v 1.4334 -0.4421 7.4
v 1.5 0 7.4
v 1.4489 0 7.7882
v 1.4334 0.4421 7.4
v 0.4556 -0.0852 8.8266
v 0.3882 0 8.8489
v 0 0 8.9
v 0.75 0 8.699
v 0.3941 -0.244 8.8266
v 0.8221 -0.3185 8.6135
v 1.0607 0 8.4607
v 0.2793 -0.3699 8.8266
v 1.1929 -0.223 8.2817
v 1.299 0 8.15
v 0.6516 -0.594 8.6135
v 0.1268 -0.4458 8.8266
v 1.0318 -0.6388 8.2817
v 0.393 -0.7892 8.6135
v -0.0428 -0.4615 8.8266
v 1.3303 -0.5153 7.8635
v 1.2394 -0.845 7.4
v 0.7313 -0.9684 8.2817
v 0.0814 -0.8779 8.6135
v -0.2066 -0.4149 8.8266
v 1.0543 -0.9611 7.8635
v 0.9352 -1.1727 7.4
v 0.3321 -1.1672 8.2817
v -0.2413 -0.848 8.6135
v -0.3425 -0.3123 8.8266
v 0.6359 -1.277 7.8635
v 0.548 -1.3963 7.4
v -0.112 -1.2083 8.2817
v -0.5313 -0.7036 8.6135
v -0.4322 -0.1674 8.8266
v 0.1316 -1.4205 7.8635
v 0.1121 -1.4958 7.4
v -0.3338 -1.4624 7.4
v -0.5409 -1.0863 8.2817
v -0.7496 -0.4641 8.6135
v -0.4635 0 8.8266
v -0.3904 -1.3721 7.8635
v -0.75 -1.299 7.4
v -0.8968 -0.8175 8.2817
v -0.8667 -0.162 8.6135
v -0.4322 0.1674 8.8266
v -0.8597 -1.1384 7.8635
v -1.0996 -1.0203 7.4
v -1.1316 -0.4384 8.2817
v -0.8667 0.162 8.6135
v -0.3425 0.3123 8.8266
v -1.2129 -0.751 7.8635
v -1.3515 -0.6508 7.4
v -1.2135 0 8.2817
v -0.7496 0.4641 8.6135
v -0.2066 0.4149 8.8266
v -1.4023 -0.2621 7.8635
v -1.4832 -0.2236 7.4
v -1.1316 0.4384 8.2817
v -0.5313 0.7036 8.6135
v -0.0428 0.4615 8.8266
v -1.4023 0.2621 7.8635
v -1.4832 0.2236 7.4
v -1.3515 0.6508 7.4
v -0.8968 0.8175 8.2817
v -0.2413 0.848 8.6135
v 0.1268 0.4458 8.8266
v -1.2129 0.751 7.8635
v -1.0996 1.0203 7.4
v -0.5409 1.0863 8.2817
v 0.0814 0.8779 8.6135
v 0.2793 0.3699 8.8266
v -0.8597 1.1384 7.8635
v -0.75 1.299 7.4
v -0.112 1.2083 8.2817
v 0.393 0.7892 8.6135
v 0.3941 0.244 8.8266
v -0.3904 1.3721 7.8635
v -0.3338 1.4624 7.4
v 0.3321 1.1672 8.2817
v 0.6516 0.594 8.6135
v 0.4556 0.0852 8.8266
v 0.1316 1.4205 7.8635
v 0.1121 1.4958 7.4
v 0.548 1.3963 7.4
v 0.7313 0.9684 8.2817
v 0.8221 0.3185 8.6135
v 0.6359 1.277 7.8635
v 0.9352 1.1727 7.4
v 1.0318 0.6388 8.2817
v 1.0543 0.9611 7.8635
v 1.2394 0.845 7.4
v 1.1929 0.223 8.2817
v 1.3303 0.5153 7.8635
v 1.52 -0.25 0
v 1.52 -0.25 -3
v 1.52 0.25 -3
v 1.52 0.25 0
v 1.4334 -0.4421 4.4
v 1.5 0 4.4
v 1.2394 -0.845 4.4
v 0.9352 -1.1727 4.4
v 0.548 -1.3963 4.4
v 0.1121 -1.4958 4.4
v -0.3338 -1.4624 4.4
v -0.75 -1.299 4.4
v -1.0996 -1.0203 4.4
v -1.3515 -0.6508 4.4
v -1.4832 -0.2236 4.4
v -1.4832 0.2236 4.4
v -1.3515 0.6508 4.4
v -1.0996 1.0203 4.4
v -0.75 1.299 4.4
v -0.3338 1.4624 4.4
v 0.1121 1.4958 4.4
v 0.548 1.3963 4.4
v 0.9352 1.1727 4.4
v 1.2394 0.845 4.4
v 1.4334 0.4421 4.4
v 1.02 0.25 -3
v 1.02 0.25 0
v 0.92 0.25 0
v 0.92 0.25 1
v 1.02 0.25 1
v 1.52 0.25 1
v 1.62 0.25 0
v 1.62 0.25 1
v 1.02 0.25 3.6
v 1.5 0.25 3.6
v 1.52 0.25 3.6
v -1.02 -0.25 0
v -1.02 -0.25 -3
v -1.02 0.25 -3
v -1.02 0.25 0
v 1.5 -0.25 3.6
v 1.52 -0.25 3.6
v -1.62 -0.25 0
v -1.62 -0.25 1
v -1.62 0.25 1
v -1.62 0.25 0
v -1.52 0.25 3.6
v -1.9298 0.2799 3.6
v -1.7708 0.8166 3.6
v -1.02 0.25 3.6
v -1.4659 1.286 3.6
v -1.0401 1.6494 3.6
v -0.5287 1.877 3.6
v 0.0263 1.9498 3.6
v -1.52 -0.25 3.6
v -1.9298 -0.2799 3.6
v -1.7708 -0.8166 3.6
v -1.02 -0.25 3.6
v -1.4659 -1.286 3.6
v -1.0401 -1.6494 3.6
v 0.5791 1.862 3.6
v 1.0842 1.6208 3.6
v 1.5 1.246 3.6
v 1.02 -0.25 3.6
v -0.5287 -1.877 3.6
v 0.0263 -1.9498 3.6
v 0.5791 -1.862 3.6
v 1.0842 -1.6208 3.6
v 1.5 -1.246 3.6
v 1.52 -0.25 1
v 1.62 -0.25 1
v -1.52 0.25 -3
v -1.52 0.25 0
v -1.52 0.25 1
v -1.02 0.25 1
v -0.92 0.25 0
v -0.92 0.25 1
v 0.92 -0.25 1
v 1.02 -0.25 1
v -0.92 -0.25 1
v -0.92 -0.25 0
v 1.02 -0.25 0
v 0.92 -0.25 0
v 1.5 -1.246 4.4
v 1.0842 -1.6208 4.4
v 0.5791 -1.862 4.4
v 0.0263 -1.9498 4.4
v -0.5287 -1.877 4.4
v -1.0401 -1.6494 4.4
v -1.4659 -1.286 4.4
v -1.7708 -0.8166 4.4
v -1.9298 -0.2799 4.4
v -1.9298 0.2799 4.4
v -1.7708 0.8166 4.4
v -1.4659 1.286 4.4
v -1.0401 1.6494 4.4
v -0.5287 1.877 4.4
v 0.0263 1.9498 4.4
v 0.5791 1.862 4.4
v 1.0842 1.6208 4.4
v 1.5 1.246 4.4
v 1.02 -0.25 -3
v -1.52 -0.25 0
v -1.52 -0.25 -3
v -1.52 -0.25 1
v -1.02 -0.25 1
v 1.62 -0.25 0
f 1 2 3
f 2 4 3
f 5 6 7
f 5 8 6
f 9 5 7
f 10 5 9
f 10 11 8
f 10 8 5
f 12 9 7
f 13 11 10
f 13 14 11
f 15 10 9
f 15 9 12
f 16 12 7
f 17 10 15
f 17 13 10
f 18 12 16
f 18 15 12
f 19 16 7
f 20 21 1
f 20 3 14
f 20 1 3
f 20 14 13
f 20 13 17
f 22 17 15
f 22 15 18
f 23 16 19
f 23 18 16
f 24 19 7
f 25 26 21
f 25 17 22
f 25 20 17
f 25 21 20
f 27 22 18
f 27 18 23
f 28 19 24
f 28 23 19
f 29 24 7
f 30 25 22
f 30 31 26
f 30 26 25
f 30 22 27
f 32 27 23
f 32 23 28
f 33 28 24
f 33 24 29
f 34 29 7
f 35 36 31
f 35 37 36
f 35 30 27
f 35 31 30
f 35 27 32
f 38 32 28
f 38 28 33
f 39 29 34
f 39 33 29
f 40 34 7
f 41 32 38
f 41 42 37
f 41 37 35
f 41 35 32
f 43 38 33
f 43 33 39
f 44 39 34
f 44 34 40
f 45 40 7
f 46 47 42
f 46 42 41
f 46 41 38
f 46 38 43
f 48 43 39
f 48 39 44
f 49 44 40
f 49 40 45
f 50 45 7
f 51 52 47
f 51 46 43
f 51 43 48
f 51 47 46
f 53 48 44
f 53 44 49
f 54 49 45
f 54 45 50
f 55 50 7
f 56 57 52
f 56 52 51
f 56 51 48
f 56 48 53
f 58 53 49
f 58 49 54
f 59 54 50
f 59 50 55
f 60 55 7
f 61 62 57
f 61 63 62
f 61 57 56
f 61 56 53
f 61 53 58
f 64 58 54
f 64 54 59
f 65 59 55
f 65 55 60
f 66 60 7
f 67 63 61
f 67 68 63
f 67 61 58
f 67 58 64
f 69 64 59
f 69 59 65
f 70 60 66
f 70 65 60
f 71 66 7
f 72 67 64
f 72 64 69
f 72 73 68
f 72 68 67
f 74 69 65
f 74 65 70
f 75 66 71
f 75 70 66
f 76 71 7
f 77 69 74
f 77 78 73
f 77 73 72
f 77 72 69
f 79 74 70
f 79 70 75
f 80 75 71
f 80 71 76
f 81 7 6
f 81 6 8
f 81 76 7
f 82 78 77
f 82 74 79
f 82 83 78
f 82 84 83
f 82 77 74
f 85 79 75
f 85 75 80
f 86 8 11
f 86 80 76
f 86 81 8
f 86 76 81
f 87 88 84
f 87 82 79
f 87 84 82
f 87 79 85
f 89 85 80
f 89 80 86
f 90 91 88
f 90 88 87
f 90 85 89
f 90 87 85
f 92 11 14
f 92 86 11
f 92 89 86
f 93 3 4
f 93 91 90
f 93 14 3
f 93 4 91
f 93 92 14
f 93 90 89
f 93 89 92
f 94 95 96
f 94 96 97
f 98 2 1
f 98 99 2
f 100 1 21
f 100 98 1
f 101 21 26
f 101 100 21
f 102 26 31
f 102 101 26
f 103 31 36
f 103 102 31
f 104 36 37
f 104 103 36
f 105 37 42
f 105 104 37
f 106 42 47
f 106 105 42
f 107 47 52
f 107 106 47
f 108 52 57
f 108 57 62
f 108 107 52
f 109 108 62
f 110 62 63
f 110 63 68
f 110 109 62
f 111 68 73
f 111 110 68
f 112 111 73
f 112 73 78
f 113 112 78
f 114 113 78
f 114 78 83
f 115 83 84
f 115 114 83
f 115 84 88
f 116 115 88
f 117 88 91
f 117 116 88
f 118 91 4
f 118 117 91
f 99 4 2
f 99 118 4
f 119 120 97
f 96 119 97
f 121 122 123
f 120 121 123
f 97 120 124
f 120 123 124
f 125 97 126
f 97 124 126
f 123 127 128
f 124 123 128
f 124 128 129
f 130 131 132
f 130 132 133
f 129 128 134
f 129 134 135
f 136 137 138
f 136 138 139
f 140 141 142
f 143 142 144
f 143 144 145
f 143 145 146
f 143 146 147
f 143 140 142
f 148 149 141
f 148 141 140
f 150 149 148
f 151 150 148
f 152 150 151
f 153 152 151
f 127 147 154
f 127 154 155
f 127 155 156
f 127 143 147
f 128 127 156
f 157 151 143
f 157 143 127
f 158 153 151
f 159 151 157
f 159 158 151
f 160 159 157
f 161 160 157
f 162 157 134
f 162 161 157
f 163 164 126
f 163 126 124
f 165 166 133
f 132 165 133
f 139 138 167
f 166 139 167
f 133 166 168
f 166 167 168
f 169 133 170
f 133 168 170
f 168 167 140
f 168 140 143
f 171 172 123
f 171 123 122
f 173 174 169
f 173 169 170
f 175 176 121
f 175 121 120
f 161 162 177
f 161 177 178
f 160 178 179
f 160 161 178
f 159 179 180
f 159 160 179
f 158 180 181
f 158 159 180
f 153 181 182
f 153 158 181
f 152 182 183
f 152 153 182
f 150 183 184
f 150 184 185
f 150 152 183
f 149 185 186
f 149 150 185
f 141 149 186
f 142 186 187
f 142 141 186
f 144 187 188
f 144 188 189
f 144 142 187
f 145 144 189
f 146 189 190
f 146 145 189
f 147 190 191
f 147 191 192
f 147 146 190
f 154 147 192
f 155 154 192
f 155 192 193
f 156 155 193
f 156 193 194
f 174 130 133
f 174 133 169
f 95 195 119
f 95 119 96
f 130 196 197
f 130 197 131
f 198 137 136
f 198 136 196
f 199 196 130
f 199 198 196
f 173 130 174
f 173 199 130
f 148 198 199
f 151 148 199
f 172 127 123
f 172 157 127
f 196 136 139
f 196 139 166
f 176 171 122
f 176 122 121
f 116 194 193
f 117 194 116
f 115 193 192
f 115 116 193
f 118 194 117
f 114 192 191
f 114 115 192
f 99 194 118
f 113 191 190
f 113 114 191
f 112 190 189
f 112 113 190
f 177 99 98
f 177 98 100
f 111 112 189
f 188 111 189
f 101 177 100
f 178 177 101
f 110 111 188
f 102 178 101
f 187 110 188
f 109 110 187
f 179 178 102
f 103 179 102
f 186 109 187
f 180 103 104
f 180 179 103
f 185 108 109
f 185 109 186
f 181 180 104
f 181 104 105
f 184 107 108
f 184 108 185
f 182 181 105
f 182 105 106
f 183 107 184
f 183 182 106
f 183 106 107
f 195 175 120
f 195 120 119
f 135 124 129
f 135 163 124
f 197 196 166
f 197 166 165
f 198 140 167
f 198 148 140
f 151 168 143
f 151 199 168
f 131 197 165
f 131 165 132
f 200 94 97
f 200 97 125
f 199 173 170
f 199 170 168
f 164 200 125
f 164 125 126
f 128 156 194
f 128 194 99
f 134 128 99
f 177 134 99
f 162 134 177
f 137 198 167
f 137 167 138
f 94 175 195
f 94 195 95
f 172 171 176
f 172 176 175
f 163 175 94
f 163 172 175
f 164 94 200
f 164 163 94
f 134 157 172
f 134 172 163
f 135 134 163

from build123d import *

# Parameters (mm, degrees)
EXTRUDE_1_DEPTH     = 0.25
EXTRUDE_1_2_DEPTH   = 0.25
CUT_EXTRUDE_START   = -0.8
CUT_EXTRUDE_1_DEPTH = 0.8


with BuildPart() as part:
    # Эскиз1 → Бобышка-Вытянуть1 (new, symmetric)
    with BuildSketch(Plane.XZ):
        Polygon((-1.52, 3.6), (-1.52, 1), (-1.62, 1), (-1.62, 0), (-1.52, 0), (-1.52, -3), (-1.02, -3), (-1.02, 0), (-0.92, 0), (-0.92, 1), (-1.02, 1), (-1.02, 3.6), align=None)
    extrude(amount=EXTRUDE_1_DEPTH, both=True)



with BuildPart() as body_2:
    # Эскиз1 → Extrude 1 2 (new, symmetric)
    with BuildSketch(Plane.XZ):
        Polygon((1.02, 3.6), (1.02, 1), (0.92, 1), (0.92, 0), (1.02, 0), (1.02, -3), (1.52, -3), (1.52, 0), (1.62, 0), (1.62, 1), (1.52, 1), (1.52, 3.6), align=None)
    extrude(amount=EXTRUDE_1_2_DEPTH, both=True)


with BuildPart() as part_1:
    add(part.part)

    add(body_2.part)  # Повернуть1 merges body 2
    # Эскиз2 → Повернуть1 (revolve)
    with BuildSketch(Plane(origin=(0, 0, 0), x_dir=(1, 0, 0), z_dir=(0, 1, 0))):
        with BuildLine():
            Line((0, -3.6), (0, -8.9))
            ThreePointArc((0, -8.9), (1.060660172, -8.460660172), (1.5, -7.4))
            Line((1.5, -7.4), (1.5, -4.4))
            Line((1.5, -4.4), (1.95, -4.4))
            Line((1.95, -4.4), (1.95, -3.6))
            Line((1.95, -3.6), (0, -3.6))
        make_face()
    revolve(axis=Axis((0, 0, 3.6), (0, 0, -1)))

    # Эскиз3 → Вырез-Вытянуть1 (cut)
    with BuildSketch(Plane.XY.offset(4.4).offset(CUT_EXTRUDE_START)):
        with BuildLine():
            Line((1.5, 1.245993579), (1.5, -1.245993579))
            ThreePointArc((1.5, -1.245993579), (1.95, 0), (1.5, 1.245993579))
        make_face()
    extrude(amount=CUT_EXTRUDE_1_DEPTH, mode=Mode.SUBTRACT)


solid = part_1.part
